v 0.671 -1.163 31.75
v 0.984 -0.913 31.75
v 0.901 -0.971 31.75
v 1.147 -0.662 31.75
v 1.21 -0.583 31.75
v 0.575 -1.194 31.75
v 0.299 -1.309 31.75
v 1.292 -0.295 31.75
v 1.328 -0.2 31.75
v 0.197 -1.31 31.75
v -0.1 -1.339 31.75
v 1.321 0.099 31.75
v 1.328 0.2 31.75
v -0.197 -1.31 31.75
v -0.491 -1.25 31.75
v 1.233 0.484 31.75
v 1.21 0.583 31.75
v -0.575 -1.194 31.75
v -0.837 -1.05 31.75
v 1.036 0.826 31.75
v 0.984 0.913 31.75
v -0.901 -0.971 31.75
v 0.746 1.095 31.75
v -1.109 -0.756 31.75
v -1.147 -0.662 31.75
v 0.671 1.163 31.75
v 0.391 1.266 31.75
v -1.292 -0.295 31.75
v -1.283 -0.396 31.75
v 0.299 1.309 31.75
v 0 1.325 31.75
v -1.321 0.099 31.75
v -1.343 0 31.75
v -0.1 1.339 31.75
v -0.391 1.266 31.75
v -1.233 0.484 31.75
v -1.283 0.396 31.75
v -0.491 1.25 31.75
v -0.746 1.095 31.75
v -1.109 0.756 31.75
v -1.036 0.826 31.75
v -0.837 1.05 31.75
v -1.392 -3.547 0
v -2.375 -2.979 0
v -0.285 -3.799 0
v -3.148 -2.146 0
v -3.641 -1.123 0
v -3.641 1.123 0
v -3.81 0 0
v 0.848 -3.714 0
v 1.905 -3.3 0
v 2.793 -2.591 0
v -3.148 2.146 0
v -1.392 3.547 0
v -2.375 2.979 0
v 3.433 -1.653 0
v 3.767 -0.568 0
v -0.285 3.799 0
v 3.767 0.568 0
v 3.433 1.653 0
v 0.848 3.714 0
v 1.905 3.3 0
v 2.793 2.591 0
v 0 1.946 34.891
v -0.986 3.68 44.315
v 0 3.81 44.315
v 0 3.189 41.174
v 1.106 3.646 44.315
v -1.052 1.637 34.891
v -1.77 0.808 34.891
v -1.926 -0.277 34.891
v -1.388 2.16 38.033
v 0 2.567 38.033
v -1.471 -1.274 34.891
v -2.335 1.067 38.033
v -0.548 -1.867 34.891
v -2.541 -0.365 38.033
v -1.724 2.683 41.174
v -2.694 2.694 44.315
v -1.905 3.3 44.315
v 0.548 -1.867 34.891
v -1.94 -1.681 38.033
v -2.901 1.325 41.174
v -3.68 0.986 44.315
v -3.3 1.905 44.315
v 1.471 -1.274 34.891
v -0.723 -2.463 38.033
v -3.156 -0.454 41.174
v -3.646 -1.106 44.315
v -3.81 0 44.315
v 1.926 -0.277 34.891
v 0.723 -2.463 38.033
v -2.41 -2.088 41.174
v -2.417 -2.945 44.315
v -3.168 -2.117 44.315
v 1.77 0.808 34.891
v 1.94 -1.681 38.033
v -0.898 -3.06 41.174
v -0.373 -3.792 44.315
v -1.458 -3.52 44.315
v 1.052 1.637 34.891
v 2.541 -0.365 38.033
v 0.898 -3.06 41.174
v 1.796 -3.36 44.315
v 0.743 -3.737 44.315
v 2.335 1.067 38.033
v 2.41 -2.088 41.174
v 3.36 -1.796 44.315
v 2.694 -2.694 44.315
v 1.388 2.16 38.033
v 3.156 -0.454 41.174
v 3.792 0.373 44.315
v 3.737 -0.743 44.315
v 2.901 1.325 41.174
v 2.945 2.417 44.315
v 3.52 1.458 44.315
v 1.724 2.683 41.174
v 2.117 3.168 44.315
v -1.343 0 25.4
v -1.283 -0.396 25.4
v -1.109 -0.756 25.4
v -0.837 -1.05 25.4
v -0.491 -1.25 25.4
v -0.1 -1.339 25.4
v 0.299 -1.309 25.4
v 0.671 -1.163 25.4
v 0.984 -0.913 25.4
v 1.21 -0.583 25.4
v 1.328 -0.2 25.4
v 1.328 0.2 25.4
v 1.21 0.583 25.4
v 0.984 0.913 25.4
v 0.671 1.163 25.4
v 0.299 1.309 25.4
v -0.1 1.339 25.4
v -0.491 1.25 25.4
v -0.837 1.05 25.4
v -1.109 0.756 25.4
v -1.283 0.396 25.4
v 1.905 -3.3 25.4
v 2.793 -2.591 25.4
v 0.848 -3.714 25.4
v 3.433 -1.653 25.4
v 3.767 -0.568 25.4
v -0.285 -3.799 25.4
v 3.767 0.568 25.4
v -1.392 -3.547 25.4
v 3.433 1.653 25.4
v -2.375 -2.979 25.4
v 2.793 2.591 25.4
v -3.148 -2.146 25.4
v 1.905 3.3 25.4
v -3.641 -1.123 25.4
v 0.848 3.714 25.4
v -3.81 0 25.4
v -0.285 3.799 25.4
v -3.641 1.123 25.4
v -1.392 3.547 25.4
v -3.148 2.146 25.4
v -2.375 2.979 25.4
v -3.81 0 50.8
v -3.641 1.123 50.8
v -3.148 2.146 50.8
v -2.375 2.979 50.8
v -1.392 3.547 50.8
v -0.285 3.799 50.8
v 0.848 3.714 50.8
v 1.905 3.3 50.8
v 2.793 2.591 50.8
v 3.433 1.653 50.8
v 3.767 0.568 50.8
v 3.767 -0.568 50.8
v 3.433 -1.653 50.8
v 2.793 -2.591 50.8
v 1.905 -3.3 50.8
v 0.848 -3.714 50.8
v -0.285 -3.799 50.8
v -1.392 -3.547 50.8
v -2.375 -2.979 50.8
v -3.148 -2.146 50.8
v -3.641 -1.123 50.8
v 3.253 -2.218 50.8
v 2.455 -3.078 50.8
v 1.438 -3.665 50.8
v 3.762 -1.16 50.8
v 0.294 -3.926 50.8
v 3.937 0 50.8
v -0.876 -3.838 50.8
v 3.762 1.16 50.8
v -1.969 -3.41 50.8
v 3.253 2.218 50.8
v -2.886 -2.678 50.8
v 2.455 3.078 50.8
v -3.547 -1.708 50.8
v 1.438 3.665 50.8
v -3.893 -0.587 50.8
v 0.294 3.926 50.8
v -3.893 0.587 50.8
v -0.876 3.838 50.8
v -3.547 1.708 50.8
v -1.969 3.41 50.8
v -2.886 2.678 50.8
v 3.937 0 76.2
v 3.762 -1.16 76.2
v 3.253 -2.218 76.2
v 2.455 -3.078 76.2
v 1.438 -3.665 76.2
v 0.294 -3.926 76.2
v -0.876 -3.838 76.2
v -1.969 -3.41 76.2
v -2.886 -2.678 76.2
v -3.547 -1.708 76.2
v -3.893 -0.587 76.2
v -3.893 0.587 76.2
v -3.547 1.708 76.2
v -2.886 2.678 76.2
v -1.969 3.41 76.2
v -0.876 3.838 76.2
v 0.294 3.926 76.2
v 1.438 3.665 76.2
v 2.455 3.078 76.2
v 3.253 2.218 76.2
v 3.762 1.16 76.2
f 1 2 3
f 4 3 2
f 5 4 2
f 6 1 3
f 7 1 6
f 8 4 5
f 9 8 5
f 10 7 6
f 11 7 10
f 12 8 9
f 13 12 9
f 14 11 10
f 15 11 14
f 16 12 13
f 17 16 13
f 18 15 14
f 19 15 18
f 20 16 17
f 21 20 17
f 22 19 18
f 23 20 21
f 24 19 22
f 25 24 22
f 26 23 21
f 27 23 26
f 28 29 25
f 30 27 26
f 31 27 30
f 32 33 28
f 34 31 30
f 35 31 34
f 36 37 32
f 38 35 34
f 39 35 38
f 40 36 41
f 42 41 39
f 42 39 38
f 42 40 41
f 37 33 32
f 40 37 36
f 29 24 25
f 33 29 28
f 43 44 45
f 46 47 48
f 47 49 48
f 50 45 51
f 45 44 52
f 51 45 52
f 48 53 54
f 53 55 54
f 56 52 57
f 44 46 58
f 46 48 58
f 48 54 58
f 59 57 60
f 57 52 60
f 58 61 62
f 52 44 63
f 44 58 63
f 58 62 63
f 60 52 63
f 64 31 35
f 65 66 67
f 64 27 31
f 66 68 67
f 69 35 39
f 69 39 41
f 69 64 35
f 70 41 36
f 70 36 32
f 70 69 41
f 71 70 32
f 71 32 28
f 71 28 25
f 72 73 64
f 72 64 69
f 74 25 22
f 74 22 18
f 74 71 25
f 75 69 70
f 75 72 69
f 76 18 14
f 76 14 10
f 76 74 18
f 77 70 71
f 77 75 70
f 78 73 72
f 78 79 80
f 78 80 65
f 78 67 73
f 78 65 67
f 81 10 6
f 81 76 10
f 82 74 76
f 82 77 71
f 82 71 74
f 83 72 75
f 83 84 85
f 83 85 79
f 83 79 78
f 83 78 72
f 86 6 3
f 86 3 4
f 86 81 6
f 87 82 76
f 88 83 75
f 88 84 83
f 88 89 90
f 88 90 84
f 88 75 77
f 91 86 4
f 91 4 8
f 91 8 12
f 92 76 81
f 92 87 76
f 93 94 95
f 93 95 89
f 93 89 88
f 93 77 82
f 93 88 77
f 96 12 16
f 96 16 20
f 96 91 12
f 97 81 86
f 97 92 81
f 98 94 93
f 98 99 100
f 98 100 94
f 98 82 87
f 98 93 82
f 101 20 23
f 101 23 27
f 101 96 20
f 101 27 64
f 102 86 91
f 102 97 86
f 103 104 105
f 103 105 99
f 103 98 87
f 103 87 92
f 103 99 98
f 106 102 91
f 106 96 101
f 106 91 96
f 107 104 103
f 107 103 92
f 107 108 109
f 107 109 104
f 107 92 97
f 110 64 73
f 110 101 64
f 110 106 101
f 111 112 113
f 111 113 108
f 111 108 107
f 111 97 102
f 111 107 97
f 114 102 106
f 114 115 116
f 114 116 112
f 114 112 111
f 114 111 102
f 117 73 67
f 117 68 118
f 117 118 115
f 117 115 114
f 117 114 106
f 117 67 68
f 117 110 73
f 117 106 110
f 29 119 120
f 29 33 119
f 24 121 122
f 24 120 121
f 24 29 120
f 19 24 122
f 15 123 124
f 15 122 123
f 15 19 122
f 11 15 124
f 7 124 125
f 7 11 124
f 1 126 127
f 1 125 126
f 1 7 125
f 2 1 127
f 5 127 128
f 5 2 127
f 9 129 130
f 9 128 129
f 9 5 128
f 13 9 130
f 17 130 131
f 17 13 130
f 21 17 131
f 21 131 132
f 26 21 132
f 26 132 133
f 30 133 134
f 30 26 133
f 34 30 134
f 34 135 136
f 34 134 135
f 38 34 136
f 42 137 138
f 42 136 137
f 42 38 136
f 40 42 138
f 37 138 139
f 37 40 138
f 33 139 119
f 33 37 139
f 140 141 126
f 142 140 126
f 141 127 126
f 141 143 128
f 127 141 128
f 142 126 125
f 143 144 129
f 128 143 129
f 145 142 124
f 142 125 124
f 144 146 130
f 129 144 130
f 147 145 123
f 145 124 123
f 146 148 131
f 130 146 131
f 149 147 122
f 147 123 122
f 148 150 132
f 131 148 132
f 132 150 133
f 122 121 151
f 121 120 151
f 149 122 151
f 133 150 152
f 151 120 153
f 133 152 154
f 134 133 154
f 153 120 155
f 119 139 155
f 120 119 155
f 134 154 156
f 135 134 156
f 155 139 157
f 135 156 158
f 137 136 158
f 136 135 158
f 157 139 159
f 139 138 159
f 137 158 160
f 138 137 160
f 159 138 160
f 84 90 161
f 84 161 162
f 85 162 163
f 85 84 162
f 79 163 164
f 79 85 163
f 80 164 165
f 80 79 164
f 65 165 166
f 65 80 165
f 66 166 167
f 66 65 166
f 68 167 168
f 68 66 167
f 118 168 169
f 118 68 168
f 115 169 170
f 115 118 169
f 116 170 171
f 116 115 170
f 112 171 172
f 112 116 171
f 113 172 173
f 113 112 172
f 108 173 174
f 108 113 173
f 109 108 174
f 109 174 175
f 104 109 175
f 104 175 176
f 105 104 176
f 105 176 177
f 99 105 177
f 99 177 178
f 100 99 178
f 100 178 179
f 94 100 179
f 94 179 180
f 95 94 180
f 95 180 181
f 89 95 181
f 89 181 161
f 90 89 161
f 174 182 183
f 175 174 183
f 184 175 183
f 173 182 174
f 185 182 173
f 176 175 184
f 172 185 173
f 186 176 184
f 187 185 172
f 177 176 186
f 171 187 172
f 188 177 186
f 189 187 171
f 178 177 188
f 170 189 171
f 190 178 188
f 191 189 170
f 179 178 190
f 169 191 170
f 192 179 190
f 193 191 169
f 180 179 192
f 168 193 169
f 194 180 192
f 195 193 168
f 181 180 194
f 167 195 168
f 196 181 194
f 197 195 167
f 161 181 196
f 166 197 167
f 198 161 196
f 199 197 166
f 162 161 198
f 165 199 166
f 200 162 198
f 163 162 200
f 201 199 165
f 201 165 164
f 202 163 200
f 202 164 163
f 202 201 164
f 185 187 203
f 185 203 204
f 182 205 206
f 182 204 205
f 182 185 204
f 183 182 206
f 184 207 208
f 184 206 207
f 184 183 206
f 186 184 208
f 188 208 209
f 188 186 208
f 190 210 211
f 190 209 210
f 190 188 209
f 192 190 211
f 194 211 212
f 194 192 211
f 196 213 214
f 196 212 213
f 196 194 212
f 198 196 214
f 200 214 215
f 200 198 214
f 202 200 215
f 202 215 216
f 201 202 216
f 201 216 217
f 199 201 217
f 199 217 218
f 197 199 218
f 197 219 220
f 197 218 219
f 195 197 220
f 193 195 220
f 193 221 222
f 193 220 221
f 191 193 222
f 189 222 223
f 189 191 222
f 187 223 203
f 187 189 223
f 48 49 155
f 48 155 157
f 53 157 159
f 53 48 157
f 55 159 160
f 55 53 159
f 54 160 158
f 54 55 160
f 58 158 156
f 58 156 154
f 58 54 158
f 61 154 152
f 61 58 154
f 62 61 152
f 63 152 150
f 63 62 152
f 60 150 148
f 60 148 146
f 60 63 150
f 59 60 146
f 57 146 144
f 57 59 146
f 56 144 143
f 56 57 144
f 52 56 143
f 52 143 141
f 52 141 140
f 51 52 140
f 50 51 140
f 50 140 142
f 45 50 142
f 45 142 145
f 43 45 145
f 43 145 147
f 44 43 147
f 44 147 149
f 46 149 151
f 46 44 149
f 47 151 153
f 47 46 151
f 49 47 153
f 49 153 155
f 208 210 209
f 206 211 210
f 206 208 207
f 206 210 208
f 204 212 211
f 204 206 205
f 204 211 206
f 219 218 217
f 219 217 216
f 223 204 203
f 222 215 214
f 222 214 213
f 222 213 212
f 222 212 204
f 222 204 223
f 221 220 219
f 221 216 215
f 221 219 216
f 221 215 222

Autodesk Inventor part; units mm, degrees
sketch "Sketch1" plane through (0, 0, 0) normal (0, 0, 1) x (1, 0, 0)
  circle A0 centre (0, 0) radius 3.937
  dimension "d0" = 7.874
extrude "Extrusion1" add sketch "Sketch1" along normal blind 76.2
sketch "Sketch2" plane through (0, 0, 0) normal (0, 0, -1) x (-1, 0, 0)
  circle A0 centre (0, 0) radius 3.937 projected
  circle A1 centre (0, 0) radius 3.81
  dimension "d3" = 7.62
extrude "Extrusion2" cut sketch "Sketch2" against normal blind 50.8
ref_plane "Work Plane1" through (0, 0, 25.4) normal (0, 0, -1) x (-1, 0, 0)
sketch "Sketch3" plane through (0, 0, 25.4) normal (0, 0, -1) x (-1, 0, 0)
  circle A0 centre (0, 0) radius 3.81 projected
  circle A1 centre (0, 0) radius 1.5875
  dimension "d7" = 3.175
ref_plane "Work Plane2" through (0, 0, 31.75) normal (0, 0, -1) x (-1, 0, 0)
ref_plane "Work Plane3" through (0, 0, 44.45) normal (0, 0, -1) x (-1, 0, 0)
sketch "Sketch4" plane through (0, 0, 31.75) normal (0, 0, -1) x (-1, 0, 0)
  circle A0 centre (0, 0) radius 3.81 projected
  circle A1 centre (0, 0) radius 1.5875
  dimension "d10" = 3.175
sketch "Sketch5" plane through (0, 0, 0) normal (0, 1, 0) x (-1, 0, 0)
  line L0 (3.81, 0) -> (3.81, 50.8) projected
  line L1 (-3.81, 0) -> (-3.81, 50.8) projected
  line L2 (5.5118, 31.75) -> (-5.5118, 31.75) projected
  line L3 (5.5118, 25.4) -> (-5.5118, 25.4) projected
  line L4 (3.81, 25.4) -> (1.3426, 25.4)
  line L5 (1.3426, 25.4) -> (1.3426, 31.75)
  line L6 (1.3426, 31.75) -> (3.81, 31.75)
  line L7 (3.81, 31.75) -> (3.81, 25.4)
  line L8 (0, 31.75) -> (0, 25.4) construction
revolve "Revolution1" cut sketch "Sketch5" angle 360 about axis through (0, 0, 31.75) along (0, 0, -1) contours L3 L5 L2 L0
sketch "Sketch6" plane through (0, 0, 44.45) normal (0, 0, -1) x (-1, 0, 0)
  circle A0 centre (0, 0) radius 3.81 projected
  circle A1 centre (0, 0) radius 3.937 projected
  line L0 (0, 0) -> (0, 3.81) construction
sketch "Sketch8" plane through (0, 0, 0) normal (1, 0, 0) x (0, 1, 0)
  line L0 (5.5118, 31.75) -> (-5.5118, 31.75) projected
  line L1 (5.5118, 44.45) -> (-5.5118, 44.45) projected
  line L2 (1.3249, 31.75) -> (3.8367, 44.45)
  line L3 (0, 31.75) -> (0, 44.45) construction
  line L4 (3.8367, 44.45) -> (3.8367, 31.75)
revolve "Revolution2" cut sketch "Sketch8" angle 360 about axis through (0, 0, 31.75) along (0, 0, 1)
properties part number "transmission plunger"
